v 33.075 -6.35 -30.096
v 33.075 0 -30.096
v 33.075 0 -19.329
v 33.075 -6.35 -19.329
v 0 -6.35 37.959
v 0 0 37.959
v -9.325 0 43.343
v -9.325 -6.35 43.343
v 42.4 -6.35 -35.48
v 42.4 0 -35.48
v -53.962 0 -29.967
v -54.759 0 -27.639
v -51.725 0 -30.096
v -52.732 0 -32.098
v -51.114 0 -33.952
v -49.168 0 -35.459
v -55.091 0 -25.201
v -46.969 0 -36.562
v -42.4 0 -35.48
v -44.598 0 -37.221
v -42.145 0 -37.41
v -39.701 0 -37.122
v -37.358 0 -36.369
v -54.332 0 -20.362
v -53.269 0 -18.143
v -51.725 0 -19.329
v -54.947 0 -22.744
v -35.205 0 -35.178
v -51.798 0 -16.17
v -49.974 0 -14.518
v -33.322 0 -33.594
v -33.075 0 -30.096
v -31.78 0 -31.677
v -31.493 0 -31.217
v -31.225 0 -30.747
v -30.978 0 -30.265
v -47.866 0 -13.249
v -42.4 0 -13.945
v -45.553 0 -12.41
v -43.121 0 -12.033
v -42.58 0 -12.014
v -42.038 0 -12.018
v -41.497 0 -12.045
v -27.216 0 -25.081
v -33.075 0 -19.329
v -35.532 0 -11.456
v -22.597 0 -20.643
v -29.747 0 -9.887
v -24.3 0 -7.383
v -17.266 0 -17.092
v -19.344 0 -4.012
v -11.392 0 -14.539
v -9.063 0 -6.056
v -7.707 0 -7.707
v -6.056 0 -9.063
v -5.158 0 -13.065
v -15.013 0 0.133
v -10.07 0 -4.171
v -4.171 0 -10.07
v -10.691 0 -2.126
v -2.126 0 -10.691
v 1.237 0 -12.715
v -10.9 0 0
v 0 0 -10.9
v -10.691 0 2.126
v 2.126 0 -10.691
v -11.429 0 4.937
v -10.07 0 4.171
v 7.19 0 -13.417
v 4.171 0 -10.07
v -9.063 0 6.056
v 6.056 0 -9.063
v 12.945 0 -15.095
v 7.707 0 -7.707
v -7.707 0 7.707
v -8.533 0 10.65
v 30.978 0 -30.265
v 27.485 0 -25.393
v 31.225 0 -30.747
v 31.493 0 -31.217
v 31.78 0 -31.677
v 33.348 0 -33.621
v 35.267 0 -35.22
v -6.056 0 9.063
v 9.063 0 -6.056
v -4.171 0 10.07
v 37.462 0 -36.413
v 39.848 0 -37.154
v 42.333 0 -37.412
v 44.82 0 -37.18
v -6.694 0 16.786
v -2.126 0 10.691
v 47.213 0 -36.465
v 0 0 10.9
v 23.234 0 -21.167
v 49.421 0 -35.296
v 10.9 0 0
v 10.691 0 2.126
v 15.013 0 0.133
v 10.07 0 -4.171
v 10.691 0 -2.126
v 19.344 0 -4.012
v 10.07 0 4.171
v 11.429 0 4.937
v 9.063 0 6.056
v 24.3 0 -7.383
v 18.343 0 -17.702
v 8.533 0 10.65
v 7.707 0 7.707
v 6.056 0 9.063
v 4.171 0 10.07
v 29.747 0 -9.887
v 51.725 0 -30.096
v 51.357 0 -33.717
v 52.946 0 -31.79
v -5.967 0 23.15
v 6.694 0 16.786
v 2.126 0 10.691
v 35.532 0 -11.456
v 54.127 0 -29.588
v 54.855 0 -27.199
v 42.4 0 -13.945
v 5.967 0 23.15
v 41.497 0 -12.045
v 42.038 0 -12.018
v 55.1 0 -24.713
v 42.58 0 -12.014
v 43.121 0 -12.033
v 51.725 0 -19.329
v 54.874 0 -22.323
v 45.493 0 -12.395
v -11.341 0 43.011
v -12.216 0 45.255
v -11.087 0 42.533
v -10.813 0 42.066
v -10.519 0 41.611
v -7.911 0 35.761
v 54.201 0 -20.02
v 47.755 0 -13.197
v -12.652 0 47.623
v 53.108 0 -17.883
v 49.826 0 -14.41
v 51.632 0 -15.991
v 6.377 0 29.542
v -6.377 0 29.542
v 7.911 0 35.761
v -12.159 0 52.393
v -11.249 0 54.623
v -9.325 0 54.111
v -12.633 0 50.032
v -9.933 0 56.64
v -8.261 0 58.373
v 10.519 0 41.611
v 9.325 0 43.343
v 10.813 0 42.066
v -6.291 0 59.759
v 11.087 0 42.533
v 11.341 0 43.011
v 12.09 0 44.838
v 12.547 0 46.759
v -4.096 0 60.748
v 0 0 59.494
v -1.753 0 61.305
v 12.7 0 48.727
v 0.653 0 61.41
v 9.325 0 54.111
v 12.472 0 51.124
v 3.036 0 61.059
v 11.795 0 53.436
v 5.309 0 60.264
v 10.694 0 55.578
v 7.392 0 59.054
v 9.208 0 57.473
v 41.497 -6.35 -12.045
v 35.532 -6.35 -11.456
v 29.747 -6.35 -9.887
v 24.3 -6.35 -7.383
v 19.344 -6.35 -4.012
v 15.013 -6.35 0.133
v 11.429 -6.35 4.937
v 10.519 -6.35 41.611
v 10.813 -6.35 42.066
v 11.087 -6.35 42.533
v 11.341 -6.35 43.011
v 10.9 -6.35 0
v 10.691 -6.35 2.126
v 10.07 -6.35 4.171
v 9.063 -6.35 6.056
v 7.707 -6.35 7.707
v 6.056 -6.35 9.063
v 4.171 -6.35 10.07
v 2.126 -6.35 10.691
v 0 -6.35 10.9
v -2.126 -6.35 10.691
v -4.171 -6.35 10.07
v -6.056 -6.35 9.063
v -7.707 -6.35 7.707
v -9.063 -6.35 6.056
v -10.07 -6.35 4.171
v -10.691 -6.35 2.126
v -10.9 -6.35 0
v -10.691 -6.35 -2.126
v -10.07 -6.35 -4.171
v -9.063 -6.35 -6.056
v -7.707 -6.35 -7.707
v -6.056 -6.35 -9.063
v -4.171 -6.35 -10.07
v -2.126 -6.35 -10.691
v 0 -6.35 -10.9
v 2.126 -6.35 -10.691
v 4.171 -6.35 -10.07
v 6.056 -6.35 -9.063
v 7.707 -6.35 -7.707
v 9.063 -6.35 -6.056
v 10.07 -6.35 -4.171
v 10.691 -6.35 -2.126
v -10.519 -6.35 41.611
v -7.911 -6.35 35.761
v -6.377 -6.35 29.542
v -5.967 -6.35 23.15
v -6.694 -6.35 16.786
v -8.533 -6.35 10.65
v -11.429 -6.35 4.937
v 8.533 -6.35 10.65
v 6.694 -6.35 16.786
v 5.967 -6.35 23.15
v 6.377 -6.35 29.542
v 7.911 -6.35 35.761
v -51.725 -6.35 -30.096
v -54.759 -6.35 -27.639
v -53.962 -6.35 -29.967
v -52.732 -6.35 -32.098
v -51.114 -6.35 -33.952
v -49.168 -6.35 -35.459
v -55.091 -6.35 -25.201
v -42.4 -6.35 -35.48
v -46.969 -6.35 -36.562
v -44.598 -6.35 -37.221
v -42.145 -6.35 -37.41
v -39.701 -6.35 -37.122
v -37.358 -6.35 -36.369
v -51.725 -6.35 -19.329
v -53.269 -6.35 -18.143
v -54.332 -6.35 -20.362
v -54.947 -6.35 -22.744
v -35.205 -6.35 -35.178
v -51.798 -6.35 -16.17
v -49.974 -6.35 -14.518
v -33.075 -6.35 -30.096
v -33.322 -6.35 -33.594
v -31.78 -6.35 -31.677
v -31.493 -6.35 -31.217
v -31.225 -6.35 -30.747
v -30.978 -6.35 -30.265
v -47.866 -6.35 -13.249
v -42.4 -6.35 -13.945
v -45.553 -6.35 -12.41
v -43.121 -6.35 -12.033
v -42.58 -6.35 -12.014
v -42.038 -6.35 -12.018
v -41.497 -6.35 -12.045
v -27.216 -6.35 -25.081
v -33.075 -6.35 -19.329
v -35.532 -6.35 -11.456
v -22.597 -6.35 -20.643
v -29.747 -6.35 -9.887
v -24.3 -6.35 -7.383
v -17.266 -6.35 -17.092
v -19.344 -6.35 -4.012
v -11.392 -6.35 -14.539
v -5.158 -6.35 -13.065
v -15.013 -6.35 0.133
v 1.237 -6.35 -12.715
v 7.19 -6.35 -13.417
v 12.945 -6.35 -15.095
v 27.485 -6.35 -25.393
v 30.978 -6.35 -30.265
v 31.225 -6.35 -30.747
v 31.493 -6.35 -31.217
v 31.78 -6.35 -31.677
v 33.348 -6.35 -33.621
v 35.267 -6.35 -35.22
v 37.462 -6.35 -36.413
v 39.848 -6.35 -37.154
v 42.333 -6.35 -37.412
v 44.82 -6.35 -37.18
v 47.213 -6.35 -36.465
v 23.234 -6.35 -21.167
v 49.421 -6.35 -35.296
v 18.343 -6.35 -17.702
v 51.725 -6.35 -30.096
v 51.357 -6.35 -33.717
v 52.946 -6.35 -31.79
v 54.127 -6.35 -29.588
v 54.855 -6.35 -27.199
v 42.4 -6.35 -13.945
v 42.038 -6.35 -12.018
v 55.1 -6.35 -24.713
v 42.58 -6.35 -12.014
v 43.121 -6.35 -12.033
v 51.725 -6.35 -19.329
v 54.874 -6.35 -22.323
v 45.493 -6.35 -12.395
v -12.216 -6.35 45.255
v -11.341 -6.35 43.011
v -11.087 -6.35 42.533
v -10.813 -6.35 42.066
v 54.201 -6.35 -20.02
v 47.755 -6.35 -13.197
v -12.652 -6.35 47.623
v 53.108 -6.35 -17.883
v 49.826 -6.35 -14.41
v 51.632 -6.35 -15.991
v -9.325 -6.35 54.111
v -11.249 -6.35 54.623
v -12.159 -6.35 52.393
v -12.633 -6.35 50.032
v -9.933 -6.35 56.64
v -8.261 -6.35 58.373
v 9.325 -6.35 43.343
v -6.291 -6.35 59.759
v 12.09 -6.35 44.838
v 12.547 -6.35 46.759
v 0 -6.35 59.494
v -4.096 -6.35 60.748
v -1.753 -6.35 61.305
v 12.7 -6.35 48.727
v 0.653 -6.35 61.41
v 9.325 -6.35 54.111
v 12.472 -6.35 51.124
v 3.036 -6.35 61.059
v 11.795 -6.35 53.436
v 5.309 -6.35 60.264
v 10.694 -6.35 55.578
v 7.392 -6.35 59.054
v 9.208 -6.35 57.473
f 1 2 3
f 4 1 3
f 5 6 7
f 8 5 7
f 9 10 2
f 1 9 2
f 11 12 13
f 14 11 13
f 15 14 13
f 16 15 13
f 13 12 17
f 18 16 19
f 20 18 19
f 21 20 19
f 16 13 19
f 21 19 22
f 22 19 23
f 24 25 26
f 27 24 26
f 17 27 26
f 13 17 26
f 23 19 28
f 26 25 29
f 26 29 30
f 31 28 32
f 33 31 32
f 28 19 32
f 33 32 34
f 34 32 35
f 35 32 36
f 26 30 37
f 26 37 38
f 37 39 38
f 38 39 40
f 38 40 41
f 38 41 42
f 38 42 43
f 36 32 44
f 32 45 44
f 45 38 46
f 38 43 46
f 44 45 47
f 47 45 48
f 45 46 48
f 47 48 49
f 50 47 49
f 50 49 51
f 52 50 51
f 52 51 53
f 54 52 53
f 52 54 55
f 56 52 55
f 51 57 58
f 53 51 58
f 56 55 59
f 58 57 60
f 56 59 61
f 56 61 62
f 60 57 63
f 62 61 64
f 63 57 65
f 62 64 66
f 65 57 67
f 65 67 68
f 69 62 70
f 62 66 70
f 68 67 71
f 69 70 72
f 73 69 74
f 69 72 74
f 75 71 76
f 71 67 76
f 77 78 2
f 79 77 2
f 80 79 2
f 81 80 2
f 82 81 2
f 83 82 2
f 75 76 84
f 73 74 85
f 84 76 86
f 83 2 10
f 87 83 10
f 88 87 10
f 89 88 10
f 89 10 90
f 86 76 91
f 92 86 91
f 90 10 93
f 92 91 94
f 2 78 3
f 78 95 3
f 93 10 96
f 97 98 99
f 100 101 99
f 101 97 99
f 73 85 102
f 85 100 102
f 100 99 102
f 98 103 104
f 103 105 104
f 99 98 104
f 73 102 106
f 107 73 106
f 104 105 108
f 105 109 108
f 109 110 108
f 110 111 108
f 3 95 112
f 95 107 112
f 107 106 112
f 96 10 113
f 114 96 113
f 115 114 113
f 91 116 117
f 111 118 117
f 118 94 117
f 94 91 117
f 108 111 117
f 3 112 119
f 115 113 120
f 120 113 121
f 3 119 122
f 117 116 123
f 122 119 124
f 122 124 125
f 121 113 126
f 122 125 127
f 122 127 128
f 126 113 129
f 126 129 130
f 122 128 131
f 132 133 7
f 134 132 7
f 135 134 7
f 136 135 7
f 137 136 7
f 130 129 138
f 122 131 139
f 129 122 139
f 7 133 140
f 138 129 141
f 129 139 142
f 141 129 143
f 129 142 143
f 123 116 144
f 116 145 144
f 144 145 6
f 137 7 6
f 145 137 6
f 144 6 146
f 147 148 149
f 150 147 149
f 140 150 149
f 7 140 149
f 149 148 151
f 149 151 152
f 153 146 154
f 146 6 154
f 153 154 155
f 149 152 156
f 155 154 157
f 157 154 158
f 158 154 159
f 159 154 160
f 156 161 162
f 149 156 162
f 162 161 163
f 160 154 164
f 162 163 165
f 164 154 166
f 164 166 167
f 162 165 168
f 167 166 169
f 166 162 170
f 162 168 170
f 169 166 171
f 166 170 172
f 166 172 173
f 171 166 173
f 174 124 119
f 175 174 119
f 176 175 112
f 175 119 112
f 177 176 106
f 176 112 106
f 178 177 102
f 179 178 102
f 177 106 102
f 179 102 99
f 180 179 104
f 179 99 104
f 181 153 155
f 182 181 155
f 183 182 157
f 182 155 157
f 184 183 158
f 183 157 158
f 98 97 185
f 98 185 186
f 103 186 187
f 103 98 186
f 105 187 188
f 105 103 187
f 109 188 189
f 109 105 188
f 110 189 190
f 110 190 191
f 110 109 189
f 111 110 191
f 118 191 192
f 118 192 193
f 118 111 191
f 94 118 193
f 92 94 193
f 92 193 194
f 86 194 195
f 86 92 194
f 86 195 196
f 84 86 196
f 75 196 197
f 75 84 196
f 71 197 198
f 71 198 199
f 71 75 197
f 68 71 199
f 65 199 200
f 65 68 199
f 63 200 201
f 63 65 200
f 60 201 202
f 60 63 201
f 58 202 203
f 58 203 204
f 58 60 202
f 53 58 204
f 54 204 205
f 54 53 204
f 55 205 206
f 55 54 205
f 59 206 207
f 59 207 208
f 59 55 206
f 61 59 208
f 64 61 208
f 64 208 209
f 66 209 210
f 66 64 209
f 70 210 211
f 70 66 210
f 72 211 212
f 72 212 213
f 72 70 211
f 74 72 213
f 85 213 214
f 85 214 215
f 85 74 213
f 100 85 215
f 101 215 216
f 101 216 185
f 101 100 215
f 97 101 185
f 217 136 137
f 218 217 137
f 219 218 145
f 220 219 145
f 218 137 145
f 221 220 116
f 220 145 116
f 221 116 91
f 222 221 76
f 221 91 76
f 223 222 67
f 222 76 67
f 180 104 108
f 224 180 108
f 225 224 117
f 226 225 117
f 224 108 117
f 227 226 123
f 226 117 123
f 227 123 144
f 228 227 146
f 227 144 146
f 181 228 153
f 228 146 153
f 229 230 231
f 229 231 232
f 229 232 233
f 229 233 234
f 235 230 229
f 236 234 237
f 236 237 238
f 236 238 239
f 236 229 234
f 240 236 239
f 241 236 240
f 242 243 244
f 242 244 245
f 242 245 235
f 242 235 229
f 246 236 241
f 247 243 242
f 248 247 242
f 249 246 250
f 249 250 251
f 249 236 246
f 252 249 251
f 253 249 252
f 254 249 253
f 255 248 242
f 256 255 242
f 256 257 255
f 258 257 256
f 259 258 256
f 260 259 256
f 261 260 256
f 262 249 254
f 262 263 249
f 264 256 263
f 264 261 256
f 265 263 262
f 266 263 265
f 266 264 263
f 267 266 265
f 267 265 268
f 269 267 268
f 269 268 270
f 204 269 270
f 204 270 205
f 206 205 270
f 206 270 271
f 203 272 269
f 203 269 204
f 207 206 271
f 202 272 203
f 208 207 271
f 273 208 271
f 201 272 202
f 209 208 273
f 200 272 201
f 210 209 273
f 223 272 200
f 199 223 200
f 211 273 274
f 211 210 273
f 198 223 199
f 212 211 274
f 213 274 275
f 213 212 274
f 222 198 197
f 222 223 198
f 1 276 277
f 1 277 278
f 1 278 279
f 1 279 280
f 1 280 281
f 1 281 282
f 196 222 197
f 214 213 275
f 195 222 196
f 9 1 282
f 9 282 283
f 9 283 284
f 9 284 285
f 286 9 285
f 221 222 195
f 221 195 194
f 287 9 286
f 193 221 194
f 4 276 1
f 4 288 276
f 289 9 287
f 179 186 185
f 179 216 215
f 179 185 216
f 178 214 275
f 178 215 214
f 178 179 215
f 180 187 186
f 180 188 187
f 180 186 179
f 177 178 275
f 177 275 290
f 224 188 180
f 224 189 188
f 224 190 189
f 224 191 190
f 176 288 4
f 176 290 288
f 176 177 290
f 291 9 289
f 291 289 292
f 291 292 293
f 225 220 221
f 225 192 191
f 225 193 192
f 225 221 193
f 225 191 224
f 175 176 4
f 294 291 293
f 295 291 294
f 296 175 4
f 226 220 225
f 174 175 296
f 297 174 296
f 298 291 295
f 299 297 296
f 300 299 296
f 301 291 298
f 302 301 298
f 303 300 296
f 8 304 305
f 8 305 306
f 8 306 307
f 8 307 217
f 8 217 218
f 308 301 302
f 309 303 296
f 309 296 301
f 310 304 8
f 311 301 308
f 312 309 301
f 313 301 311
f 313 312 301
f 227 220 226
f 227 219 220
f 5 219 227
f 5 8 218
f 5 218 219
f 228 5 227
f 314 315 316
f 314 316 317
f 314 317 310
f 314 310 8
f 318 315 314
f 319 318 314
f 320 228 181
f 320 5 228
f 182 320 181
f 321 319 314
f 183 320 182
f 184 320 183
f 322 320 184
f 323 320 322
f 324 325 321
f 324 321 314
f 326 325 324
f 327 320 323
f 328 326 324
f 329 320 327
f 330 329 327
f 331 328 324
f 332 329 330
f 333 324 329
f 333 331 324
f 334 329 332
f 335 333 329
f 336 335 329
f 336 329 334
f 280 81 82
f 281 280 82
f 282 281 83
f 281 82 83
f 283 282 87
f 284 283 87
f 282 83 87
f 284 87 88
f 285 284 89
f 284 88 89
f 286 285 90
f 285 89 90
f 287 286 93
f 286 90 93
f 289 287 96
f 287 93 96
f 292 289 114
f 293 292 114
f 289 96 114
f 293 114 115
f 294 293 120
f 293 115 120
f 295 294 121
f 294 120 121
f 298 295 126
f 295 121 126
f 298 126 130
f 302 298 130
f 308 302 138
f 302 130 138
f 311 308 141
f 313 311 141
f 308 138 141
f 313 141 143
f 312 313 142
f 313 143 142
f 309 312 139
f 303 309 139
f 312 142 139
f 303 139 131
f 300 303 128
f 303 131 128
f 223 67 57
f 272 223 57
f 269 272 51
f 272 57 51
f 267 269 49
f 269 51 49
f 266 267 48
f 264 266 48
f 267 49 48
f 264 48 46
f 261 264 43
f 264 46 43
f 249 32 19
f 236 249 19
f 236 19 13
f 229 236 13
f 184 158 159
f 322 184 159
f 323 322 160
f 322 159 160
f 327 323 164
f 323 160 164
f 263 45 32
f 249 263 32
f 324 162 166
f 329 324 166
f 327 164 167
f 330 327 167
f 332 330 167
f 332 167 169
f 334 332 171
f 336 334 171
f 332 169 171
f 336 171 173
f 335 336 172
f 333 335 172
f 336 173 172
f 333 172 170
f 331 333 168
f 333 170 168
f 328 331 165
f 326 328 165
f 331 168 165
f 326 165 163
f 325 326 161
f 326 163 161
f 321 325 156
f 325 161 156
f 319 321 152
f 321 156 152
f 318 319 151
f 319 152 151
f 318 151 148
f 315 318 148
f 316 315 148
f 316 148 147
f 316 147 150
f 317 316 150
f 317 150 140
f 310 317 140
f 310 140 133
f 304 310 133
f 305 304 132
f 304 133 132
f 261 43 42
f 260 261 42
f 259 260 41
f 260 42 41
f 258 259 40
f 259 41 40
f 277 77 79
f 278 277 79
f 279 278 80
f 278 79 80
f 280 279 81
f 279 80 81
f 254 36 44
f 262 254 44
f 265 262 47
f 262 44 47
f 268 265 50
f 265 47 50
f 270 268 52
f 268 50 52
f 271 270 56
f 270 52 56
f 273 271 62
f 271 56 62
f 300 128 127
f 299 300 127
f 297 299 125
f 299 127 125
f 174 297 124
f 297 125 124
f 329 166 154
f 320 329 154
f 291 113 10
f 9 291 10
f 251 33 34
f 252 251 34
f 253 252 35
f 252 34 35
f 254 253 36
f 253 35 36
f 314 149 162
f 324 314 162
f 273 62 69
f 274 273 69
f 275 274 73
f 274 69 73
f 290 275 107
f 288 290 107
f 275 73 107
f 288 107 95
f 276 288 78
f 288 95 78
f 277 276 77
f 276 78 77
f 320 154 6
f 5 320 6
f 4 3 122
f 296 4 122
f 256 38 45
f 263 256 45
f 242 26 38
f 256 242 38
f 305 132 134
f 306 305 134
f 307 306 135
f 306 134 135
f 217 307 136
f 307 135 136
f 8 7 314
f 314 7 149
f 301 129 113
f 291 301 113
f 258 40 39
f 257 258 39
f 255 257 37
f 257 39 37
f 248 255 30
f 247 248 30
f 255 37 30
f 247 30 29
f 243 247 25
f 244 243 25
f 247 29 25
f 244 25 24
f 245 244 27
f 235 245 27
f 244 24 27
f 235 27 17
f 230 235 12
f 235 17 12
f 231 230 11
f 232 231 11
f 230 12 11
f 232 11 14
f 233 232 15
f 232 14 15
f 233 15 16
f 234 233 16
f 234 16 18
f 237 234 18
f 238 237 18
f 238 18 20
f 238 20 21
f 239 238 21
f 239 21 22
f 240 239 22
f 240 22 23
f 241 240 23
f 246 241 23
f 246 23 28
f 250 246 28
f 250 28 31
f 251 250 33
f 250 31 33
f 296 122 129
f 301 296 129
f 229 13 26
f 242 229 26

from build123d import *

# Parameters (mm, degrees)
F0_R     = 10.9
F1_DEPTH = 6.35


with BuildPart() as f1:
    # F0 (on Front) → F1 (new body)
    with BuildSketch(Plane.XZ):
        with BuildLine():
            ThreePointArc((11.341128, 43.011204), (12.355613, 45.78938), (12.7, 48.726868))
            ThreePointArc((12.7, 48.726868), (-2.937488, 61.082481), (-11.341128, 43.011204))
            ThreePointArc((-11.341128, 43.011204), (-10.922306, 42.315719), (-10.519233, 41.610989))
            ThreePointArc((-10.519233, 41.610989), (0, 36.026868), (10.519233, 41.610989))
            ThreePointArc((10.519233, 41.610989), (10.922306, 42.315719), (11.341128, 43.011204))
        make_face()
        Polygon((0, 59.49445), (9.325, 54.110659), (9.325, 43.343077), (0, 37.959285), (-9.325, 43.343077), (-9.325, 54.110659), align=None, mode=Mode.SUBTRACT)
        with BuildLine():
            ThreePointArc((-10.519233, 41.610989), (-10.922306, 42.315719), (-11.341128, 43.011204))
            ThreePointArc((-11.341128, 43.011204), (-10.95258, 42.297949), (-10.519233, 41.610989))
        make_face()
        with BuildLine():
            ThreePointArc((10.519233, 41.610989), (10.95258, 42.297949), (11.341128, 43.011204))
            ThreePointArc((11.341128, 43.011204), (10.922306, 42.315719), (10.519233, 41.610989))
        make_face()
        with BuildLine():
            ThreePointArc((10.519233, 41.610989), (0, 36.026868), (-10.519233, 41.610989))
            ThreePointArc((-10.519233, 41.610989), (-5.967201, 23.149777), (-11.428743, 4.936899))
            ThreePointArc((-11.428743, 4.936899), (-24.300415, -7.383263), (-41.497408, -12.044784))
            ThreePointArc((-41.497408, -12.044784), (-33.106319, -16.057504), (-29.700323, -24.712646))
            ThreePointArc((-29.700323, -24.712646), (-30.023908, -27.561217), (-30.978175, -30.26463))
            ThreePointArc((-30.978175, -30.26463), (-17.266312, -17.091848), (1.237274, -12.715244))
            ThreePointArc((1.237274, -12.715244), (18.342683, -17.702358), (30.978175, -30.26463))
            ThreePointArc((30.978175, -30.26463), (31.401801, -18.362646), (41.497408, -12.044784))
            ThreePointArc((41.497408, -12.044784), (24.300415, -7.383263), (11.428743, 4.936899))
            ThreePointArc((11.428743, 4.936899), (5.967201, 23.149777), (10.519233, 41.610989))
        make_face()
        Circle(F0_R, mode=Mode.SUBTRACT)
        with BuildLine():
            ThreePointArc((-29.700323, -24.712646), (-33.106319, -16.057504), (-41.497408, -12.044784))
            ThreePointArc((-41.497408, -12.044784), (-42.309258, -12.048077), (-43.120978, -12.033109))
            ThreePointArc((-43.120978, -12.033109), (-53.398846, -31.062646), (-31.779849, -31.67652))
            ThreePointArc((-31.779849, -31.67652), (-31.386952, -30.966066), (-30.978175, -30.26463))
            ThreePointArc((-30.978175, -30.26463), (-30.023908, -27.561217), (-29.700323, -24.712646))
        make_face()
        Polygon((-51.725323, -19.328855), (-42.400323, -13.945064), (-33.075323, -19.328855), (-33.075323, -30.096438), (-42.400323, -35.480229), (-51.725323, -30.096438), align=None, mode=Mode.SUBTRACT)
        with BuildLine():
            ThreePointArc((-43.120978, -12.033109), (-42.309258, -12.048077), (-41.497408, -12.044784))
            ThreePointArc((-41.497408, -12.044784), (-42.309006, -12.012975), (-43.120978, -12.033109))
        make_face()
        with BuildLine():
            ThreePointArc((43.120978, -12.033109), (42.309006, -12.012975), (41.497408, -12.044784))
            ThreePointArc((41.497408, -12.044784), (42.309258, -12.048077), (43.120978, -12.033109))
        make_face()
        with BuildLine():
            ThreePointArc((43.120978, -12.033109), (42.309258, -12.048077), (41.497408, -12.044784))
            ThreePointArc((41.497408, -12.044784), (31.401801, -18.362646), (30.978175, -30.26463))
            ThreePointArc((30.978175, -30.26463), (31.386952, -30.966066), (31.779849, -31.67652))
            ThreePointArc((31.779849, -31.67652), (46.03419, -36.881665), (55.100323, -24.712646))
            ThreePointArc((55.100323, -24.712646), (51.631854, -15.990901), (43.120978, -12.033109))
        make_face()
        Polygon((42.400323, -35.480229), (33.075323, -30.096438), (33.075323, -19.328855), (42.400323, -13.945064), (51.725323, -19.328855), (51.725323, -30.096438), align=None, mode=Mode.SUBTRACT)
        with BuildLine():
            ThreePointArc((31.779849, -31.67652), (31.386952, -30.966066), (30.978175, -30.26463))
            ThreePointArc((30.978175, -30.26463), (31.356426, -30.983399), (31.779849, -31.67652))
        make_face()
        with BuildLine():
            ThreePointArc((-30.978175, -30.26463), (-31.386952, -30.966066), (-31.779849, -31.67652))
            ThreePointArc((-31.779849, -31.67652), (-31.356426, -30.983399), (-30.978175, -30.26463))
        make_face()
    extrude(amount=F1_DEPTH)


solid = f1.part
